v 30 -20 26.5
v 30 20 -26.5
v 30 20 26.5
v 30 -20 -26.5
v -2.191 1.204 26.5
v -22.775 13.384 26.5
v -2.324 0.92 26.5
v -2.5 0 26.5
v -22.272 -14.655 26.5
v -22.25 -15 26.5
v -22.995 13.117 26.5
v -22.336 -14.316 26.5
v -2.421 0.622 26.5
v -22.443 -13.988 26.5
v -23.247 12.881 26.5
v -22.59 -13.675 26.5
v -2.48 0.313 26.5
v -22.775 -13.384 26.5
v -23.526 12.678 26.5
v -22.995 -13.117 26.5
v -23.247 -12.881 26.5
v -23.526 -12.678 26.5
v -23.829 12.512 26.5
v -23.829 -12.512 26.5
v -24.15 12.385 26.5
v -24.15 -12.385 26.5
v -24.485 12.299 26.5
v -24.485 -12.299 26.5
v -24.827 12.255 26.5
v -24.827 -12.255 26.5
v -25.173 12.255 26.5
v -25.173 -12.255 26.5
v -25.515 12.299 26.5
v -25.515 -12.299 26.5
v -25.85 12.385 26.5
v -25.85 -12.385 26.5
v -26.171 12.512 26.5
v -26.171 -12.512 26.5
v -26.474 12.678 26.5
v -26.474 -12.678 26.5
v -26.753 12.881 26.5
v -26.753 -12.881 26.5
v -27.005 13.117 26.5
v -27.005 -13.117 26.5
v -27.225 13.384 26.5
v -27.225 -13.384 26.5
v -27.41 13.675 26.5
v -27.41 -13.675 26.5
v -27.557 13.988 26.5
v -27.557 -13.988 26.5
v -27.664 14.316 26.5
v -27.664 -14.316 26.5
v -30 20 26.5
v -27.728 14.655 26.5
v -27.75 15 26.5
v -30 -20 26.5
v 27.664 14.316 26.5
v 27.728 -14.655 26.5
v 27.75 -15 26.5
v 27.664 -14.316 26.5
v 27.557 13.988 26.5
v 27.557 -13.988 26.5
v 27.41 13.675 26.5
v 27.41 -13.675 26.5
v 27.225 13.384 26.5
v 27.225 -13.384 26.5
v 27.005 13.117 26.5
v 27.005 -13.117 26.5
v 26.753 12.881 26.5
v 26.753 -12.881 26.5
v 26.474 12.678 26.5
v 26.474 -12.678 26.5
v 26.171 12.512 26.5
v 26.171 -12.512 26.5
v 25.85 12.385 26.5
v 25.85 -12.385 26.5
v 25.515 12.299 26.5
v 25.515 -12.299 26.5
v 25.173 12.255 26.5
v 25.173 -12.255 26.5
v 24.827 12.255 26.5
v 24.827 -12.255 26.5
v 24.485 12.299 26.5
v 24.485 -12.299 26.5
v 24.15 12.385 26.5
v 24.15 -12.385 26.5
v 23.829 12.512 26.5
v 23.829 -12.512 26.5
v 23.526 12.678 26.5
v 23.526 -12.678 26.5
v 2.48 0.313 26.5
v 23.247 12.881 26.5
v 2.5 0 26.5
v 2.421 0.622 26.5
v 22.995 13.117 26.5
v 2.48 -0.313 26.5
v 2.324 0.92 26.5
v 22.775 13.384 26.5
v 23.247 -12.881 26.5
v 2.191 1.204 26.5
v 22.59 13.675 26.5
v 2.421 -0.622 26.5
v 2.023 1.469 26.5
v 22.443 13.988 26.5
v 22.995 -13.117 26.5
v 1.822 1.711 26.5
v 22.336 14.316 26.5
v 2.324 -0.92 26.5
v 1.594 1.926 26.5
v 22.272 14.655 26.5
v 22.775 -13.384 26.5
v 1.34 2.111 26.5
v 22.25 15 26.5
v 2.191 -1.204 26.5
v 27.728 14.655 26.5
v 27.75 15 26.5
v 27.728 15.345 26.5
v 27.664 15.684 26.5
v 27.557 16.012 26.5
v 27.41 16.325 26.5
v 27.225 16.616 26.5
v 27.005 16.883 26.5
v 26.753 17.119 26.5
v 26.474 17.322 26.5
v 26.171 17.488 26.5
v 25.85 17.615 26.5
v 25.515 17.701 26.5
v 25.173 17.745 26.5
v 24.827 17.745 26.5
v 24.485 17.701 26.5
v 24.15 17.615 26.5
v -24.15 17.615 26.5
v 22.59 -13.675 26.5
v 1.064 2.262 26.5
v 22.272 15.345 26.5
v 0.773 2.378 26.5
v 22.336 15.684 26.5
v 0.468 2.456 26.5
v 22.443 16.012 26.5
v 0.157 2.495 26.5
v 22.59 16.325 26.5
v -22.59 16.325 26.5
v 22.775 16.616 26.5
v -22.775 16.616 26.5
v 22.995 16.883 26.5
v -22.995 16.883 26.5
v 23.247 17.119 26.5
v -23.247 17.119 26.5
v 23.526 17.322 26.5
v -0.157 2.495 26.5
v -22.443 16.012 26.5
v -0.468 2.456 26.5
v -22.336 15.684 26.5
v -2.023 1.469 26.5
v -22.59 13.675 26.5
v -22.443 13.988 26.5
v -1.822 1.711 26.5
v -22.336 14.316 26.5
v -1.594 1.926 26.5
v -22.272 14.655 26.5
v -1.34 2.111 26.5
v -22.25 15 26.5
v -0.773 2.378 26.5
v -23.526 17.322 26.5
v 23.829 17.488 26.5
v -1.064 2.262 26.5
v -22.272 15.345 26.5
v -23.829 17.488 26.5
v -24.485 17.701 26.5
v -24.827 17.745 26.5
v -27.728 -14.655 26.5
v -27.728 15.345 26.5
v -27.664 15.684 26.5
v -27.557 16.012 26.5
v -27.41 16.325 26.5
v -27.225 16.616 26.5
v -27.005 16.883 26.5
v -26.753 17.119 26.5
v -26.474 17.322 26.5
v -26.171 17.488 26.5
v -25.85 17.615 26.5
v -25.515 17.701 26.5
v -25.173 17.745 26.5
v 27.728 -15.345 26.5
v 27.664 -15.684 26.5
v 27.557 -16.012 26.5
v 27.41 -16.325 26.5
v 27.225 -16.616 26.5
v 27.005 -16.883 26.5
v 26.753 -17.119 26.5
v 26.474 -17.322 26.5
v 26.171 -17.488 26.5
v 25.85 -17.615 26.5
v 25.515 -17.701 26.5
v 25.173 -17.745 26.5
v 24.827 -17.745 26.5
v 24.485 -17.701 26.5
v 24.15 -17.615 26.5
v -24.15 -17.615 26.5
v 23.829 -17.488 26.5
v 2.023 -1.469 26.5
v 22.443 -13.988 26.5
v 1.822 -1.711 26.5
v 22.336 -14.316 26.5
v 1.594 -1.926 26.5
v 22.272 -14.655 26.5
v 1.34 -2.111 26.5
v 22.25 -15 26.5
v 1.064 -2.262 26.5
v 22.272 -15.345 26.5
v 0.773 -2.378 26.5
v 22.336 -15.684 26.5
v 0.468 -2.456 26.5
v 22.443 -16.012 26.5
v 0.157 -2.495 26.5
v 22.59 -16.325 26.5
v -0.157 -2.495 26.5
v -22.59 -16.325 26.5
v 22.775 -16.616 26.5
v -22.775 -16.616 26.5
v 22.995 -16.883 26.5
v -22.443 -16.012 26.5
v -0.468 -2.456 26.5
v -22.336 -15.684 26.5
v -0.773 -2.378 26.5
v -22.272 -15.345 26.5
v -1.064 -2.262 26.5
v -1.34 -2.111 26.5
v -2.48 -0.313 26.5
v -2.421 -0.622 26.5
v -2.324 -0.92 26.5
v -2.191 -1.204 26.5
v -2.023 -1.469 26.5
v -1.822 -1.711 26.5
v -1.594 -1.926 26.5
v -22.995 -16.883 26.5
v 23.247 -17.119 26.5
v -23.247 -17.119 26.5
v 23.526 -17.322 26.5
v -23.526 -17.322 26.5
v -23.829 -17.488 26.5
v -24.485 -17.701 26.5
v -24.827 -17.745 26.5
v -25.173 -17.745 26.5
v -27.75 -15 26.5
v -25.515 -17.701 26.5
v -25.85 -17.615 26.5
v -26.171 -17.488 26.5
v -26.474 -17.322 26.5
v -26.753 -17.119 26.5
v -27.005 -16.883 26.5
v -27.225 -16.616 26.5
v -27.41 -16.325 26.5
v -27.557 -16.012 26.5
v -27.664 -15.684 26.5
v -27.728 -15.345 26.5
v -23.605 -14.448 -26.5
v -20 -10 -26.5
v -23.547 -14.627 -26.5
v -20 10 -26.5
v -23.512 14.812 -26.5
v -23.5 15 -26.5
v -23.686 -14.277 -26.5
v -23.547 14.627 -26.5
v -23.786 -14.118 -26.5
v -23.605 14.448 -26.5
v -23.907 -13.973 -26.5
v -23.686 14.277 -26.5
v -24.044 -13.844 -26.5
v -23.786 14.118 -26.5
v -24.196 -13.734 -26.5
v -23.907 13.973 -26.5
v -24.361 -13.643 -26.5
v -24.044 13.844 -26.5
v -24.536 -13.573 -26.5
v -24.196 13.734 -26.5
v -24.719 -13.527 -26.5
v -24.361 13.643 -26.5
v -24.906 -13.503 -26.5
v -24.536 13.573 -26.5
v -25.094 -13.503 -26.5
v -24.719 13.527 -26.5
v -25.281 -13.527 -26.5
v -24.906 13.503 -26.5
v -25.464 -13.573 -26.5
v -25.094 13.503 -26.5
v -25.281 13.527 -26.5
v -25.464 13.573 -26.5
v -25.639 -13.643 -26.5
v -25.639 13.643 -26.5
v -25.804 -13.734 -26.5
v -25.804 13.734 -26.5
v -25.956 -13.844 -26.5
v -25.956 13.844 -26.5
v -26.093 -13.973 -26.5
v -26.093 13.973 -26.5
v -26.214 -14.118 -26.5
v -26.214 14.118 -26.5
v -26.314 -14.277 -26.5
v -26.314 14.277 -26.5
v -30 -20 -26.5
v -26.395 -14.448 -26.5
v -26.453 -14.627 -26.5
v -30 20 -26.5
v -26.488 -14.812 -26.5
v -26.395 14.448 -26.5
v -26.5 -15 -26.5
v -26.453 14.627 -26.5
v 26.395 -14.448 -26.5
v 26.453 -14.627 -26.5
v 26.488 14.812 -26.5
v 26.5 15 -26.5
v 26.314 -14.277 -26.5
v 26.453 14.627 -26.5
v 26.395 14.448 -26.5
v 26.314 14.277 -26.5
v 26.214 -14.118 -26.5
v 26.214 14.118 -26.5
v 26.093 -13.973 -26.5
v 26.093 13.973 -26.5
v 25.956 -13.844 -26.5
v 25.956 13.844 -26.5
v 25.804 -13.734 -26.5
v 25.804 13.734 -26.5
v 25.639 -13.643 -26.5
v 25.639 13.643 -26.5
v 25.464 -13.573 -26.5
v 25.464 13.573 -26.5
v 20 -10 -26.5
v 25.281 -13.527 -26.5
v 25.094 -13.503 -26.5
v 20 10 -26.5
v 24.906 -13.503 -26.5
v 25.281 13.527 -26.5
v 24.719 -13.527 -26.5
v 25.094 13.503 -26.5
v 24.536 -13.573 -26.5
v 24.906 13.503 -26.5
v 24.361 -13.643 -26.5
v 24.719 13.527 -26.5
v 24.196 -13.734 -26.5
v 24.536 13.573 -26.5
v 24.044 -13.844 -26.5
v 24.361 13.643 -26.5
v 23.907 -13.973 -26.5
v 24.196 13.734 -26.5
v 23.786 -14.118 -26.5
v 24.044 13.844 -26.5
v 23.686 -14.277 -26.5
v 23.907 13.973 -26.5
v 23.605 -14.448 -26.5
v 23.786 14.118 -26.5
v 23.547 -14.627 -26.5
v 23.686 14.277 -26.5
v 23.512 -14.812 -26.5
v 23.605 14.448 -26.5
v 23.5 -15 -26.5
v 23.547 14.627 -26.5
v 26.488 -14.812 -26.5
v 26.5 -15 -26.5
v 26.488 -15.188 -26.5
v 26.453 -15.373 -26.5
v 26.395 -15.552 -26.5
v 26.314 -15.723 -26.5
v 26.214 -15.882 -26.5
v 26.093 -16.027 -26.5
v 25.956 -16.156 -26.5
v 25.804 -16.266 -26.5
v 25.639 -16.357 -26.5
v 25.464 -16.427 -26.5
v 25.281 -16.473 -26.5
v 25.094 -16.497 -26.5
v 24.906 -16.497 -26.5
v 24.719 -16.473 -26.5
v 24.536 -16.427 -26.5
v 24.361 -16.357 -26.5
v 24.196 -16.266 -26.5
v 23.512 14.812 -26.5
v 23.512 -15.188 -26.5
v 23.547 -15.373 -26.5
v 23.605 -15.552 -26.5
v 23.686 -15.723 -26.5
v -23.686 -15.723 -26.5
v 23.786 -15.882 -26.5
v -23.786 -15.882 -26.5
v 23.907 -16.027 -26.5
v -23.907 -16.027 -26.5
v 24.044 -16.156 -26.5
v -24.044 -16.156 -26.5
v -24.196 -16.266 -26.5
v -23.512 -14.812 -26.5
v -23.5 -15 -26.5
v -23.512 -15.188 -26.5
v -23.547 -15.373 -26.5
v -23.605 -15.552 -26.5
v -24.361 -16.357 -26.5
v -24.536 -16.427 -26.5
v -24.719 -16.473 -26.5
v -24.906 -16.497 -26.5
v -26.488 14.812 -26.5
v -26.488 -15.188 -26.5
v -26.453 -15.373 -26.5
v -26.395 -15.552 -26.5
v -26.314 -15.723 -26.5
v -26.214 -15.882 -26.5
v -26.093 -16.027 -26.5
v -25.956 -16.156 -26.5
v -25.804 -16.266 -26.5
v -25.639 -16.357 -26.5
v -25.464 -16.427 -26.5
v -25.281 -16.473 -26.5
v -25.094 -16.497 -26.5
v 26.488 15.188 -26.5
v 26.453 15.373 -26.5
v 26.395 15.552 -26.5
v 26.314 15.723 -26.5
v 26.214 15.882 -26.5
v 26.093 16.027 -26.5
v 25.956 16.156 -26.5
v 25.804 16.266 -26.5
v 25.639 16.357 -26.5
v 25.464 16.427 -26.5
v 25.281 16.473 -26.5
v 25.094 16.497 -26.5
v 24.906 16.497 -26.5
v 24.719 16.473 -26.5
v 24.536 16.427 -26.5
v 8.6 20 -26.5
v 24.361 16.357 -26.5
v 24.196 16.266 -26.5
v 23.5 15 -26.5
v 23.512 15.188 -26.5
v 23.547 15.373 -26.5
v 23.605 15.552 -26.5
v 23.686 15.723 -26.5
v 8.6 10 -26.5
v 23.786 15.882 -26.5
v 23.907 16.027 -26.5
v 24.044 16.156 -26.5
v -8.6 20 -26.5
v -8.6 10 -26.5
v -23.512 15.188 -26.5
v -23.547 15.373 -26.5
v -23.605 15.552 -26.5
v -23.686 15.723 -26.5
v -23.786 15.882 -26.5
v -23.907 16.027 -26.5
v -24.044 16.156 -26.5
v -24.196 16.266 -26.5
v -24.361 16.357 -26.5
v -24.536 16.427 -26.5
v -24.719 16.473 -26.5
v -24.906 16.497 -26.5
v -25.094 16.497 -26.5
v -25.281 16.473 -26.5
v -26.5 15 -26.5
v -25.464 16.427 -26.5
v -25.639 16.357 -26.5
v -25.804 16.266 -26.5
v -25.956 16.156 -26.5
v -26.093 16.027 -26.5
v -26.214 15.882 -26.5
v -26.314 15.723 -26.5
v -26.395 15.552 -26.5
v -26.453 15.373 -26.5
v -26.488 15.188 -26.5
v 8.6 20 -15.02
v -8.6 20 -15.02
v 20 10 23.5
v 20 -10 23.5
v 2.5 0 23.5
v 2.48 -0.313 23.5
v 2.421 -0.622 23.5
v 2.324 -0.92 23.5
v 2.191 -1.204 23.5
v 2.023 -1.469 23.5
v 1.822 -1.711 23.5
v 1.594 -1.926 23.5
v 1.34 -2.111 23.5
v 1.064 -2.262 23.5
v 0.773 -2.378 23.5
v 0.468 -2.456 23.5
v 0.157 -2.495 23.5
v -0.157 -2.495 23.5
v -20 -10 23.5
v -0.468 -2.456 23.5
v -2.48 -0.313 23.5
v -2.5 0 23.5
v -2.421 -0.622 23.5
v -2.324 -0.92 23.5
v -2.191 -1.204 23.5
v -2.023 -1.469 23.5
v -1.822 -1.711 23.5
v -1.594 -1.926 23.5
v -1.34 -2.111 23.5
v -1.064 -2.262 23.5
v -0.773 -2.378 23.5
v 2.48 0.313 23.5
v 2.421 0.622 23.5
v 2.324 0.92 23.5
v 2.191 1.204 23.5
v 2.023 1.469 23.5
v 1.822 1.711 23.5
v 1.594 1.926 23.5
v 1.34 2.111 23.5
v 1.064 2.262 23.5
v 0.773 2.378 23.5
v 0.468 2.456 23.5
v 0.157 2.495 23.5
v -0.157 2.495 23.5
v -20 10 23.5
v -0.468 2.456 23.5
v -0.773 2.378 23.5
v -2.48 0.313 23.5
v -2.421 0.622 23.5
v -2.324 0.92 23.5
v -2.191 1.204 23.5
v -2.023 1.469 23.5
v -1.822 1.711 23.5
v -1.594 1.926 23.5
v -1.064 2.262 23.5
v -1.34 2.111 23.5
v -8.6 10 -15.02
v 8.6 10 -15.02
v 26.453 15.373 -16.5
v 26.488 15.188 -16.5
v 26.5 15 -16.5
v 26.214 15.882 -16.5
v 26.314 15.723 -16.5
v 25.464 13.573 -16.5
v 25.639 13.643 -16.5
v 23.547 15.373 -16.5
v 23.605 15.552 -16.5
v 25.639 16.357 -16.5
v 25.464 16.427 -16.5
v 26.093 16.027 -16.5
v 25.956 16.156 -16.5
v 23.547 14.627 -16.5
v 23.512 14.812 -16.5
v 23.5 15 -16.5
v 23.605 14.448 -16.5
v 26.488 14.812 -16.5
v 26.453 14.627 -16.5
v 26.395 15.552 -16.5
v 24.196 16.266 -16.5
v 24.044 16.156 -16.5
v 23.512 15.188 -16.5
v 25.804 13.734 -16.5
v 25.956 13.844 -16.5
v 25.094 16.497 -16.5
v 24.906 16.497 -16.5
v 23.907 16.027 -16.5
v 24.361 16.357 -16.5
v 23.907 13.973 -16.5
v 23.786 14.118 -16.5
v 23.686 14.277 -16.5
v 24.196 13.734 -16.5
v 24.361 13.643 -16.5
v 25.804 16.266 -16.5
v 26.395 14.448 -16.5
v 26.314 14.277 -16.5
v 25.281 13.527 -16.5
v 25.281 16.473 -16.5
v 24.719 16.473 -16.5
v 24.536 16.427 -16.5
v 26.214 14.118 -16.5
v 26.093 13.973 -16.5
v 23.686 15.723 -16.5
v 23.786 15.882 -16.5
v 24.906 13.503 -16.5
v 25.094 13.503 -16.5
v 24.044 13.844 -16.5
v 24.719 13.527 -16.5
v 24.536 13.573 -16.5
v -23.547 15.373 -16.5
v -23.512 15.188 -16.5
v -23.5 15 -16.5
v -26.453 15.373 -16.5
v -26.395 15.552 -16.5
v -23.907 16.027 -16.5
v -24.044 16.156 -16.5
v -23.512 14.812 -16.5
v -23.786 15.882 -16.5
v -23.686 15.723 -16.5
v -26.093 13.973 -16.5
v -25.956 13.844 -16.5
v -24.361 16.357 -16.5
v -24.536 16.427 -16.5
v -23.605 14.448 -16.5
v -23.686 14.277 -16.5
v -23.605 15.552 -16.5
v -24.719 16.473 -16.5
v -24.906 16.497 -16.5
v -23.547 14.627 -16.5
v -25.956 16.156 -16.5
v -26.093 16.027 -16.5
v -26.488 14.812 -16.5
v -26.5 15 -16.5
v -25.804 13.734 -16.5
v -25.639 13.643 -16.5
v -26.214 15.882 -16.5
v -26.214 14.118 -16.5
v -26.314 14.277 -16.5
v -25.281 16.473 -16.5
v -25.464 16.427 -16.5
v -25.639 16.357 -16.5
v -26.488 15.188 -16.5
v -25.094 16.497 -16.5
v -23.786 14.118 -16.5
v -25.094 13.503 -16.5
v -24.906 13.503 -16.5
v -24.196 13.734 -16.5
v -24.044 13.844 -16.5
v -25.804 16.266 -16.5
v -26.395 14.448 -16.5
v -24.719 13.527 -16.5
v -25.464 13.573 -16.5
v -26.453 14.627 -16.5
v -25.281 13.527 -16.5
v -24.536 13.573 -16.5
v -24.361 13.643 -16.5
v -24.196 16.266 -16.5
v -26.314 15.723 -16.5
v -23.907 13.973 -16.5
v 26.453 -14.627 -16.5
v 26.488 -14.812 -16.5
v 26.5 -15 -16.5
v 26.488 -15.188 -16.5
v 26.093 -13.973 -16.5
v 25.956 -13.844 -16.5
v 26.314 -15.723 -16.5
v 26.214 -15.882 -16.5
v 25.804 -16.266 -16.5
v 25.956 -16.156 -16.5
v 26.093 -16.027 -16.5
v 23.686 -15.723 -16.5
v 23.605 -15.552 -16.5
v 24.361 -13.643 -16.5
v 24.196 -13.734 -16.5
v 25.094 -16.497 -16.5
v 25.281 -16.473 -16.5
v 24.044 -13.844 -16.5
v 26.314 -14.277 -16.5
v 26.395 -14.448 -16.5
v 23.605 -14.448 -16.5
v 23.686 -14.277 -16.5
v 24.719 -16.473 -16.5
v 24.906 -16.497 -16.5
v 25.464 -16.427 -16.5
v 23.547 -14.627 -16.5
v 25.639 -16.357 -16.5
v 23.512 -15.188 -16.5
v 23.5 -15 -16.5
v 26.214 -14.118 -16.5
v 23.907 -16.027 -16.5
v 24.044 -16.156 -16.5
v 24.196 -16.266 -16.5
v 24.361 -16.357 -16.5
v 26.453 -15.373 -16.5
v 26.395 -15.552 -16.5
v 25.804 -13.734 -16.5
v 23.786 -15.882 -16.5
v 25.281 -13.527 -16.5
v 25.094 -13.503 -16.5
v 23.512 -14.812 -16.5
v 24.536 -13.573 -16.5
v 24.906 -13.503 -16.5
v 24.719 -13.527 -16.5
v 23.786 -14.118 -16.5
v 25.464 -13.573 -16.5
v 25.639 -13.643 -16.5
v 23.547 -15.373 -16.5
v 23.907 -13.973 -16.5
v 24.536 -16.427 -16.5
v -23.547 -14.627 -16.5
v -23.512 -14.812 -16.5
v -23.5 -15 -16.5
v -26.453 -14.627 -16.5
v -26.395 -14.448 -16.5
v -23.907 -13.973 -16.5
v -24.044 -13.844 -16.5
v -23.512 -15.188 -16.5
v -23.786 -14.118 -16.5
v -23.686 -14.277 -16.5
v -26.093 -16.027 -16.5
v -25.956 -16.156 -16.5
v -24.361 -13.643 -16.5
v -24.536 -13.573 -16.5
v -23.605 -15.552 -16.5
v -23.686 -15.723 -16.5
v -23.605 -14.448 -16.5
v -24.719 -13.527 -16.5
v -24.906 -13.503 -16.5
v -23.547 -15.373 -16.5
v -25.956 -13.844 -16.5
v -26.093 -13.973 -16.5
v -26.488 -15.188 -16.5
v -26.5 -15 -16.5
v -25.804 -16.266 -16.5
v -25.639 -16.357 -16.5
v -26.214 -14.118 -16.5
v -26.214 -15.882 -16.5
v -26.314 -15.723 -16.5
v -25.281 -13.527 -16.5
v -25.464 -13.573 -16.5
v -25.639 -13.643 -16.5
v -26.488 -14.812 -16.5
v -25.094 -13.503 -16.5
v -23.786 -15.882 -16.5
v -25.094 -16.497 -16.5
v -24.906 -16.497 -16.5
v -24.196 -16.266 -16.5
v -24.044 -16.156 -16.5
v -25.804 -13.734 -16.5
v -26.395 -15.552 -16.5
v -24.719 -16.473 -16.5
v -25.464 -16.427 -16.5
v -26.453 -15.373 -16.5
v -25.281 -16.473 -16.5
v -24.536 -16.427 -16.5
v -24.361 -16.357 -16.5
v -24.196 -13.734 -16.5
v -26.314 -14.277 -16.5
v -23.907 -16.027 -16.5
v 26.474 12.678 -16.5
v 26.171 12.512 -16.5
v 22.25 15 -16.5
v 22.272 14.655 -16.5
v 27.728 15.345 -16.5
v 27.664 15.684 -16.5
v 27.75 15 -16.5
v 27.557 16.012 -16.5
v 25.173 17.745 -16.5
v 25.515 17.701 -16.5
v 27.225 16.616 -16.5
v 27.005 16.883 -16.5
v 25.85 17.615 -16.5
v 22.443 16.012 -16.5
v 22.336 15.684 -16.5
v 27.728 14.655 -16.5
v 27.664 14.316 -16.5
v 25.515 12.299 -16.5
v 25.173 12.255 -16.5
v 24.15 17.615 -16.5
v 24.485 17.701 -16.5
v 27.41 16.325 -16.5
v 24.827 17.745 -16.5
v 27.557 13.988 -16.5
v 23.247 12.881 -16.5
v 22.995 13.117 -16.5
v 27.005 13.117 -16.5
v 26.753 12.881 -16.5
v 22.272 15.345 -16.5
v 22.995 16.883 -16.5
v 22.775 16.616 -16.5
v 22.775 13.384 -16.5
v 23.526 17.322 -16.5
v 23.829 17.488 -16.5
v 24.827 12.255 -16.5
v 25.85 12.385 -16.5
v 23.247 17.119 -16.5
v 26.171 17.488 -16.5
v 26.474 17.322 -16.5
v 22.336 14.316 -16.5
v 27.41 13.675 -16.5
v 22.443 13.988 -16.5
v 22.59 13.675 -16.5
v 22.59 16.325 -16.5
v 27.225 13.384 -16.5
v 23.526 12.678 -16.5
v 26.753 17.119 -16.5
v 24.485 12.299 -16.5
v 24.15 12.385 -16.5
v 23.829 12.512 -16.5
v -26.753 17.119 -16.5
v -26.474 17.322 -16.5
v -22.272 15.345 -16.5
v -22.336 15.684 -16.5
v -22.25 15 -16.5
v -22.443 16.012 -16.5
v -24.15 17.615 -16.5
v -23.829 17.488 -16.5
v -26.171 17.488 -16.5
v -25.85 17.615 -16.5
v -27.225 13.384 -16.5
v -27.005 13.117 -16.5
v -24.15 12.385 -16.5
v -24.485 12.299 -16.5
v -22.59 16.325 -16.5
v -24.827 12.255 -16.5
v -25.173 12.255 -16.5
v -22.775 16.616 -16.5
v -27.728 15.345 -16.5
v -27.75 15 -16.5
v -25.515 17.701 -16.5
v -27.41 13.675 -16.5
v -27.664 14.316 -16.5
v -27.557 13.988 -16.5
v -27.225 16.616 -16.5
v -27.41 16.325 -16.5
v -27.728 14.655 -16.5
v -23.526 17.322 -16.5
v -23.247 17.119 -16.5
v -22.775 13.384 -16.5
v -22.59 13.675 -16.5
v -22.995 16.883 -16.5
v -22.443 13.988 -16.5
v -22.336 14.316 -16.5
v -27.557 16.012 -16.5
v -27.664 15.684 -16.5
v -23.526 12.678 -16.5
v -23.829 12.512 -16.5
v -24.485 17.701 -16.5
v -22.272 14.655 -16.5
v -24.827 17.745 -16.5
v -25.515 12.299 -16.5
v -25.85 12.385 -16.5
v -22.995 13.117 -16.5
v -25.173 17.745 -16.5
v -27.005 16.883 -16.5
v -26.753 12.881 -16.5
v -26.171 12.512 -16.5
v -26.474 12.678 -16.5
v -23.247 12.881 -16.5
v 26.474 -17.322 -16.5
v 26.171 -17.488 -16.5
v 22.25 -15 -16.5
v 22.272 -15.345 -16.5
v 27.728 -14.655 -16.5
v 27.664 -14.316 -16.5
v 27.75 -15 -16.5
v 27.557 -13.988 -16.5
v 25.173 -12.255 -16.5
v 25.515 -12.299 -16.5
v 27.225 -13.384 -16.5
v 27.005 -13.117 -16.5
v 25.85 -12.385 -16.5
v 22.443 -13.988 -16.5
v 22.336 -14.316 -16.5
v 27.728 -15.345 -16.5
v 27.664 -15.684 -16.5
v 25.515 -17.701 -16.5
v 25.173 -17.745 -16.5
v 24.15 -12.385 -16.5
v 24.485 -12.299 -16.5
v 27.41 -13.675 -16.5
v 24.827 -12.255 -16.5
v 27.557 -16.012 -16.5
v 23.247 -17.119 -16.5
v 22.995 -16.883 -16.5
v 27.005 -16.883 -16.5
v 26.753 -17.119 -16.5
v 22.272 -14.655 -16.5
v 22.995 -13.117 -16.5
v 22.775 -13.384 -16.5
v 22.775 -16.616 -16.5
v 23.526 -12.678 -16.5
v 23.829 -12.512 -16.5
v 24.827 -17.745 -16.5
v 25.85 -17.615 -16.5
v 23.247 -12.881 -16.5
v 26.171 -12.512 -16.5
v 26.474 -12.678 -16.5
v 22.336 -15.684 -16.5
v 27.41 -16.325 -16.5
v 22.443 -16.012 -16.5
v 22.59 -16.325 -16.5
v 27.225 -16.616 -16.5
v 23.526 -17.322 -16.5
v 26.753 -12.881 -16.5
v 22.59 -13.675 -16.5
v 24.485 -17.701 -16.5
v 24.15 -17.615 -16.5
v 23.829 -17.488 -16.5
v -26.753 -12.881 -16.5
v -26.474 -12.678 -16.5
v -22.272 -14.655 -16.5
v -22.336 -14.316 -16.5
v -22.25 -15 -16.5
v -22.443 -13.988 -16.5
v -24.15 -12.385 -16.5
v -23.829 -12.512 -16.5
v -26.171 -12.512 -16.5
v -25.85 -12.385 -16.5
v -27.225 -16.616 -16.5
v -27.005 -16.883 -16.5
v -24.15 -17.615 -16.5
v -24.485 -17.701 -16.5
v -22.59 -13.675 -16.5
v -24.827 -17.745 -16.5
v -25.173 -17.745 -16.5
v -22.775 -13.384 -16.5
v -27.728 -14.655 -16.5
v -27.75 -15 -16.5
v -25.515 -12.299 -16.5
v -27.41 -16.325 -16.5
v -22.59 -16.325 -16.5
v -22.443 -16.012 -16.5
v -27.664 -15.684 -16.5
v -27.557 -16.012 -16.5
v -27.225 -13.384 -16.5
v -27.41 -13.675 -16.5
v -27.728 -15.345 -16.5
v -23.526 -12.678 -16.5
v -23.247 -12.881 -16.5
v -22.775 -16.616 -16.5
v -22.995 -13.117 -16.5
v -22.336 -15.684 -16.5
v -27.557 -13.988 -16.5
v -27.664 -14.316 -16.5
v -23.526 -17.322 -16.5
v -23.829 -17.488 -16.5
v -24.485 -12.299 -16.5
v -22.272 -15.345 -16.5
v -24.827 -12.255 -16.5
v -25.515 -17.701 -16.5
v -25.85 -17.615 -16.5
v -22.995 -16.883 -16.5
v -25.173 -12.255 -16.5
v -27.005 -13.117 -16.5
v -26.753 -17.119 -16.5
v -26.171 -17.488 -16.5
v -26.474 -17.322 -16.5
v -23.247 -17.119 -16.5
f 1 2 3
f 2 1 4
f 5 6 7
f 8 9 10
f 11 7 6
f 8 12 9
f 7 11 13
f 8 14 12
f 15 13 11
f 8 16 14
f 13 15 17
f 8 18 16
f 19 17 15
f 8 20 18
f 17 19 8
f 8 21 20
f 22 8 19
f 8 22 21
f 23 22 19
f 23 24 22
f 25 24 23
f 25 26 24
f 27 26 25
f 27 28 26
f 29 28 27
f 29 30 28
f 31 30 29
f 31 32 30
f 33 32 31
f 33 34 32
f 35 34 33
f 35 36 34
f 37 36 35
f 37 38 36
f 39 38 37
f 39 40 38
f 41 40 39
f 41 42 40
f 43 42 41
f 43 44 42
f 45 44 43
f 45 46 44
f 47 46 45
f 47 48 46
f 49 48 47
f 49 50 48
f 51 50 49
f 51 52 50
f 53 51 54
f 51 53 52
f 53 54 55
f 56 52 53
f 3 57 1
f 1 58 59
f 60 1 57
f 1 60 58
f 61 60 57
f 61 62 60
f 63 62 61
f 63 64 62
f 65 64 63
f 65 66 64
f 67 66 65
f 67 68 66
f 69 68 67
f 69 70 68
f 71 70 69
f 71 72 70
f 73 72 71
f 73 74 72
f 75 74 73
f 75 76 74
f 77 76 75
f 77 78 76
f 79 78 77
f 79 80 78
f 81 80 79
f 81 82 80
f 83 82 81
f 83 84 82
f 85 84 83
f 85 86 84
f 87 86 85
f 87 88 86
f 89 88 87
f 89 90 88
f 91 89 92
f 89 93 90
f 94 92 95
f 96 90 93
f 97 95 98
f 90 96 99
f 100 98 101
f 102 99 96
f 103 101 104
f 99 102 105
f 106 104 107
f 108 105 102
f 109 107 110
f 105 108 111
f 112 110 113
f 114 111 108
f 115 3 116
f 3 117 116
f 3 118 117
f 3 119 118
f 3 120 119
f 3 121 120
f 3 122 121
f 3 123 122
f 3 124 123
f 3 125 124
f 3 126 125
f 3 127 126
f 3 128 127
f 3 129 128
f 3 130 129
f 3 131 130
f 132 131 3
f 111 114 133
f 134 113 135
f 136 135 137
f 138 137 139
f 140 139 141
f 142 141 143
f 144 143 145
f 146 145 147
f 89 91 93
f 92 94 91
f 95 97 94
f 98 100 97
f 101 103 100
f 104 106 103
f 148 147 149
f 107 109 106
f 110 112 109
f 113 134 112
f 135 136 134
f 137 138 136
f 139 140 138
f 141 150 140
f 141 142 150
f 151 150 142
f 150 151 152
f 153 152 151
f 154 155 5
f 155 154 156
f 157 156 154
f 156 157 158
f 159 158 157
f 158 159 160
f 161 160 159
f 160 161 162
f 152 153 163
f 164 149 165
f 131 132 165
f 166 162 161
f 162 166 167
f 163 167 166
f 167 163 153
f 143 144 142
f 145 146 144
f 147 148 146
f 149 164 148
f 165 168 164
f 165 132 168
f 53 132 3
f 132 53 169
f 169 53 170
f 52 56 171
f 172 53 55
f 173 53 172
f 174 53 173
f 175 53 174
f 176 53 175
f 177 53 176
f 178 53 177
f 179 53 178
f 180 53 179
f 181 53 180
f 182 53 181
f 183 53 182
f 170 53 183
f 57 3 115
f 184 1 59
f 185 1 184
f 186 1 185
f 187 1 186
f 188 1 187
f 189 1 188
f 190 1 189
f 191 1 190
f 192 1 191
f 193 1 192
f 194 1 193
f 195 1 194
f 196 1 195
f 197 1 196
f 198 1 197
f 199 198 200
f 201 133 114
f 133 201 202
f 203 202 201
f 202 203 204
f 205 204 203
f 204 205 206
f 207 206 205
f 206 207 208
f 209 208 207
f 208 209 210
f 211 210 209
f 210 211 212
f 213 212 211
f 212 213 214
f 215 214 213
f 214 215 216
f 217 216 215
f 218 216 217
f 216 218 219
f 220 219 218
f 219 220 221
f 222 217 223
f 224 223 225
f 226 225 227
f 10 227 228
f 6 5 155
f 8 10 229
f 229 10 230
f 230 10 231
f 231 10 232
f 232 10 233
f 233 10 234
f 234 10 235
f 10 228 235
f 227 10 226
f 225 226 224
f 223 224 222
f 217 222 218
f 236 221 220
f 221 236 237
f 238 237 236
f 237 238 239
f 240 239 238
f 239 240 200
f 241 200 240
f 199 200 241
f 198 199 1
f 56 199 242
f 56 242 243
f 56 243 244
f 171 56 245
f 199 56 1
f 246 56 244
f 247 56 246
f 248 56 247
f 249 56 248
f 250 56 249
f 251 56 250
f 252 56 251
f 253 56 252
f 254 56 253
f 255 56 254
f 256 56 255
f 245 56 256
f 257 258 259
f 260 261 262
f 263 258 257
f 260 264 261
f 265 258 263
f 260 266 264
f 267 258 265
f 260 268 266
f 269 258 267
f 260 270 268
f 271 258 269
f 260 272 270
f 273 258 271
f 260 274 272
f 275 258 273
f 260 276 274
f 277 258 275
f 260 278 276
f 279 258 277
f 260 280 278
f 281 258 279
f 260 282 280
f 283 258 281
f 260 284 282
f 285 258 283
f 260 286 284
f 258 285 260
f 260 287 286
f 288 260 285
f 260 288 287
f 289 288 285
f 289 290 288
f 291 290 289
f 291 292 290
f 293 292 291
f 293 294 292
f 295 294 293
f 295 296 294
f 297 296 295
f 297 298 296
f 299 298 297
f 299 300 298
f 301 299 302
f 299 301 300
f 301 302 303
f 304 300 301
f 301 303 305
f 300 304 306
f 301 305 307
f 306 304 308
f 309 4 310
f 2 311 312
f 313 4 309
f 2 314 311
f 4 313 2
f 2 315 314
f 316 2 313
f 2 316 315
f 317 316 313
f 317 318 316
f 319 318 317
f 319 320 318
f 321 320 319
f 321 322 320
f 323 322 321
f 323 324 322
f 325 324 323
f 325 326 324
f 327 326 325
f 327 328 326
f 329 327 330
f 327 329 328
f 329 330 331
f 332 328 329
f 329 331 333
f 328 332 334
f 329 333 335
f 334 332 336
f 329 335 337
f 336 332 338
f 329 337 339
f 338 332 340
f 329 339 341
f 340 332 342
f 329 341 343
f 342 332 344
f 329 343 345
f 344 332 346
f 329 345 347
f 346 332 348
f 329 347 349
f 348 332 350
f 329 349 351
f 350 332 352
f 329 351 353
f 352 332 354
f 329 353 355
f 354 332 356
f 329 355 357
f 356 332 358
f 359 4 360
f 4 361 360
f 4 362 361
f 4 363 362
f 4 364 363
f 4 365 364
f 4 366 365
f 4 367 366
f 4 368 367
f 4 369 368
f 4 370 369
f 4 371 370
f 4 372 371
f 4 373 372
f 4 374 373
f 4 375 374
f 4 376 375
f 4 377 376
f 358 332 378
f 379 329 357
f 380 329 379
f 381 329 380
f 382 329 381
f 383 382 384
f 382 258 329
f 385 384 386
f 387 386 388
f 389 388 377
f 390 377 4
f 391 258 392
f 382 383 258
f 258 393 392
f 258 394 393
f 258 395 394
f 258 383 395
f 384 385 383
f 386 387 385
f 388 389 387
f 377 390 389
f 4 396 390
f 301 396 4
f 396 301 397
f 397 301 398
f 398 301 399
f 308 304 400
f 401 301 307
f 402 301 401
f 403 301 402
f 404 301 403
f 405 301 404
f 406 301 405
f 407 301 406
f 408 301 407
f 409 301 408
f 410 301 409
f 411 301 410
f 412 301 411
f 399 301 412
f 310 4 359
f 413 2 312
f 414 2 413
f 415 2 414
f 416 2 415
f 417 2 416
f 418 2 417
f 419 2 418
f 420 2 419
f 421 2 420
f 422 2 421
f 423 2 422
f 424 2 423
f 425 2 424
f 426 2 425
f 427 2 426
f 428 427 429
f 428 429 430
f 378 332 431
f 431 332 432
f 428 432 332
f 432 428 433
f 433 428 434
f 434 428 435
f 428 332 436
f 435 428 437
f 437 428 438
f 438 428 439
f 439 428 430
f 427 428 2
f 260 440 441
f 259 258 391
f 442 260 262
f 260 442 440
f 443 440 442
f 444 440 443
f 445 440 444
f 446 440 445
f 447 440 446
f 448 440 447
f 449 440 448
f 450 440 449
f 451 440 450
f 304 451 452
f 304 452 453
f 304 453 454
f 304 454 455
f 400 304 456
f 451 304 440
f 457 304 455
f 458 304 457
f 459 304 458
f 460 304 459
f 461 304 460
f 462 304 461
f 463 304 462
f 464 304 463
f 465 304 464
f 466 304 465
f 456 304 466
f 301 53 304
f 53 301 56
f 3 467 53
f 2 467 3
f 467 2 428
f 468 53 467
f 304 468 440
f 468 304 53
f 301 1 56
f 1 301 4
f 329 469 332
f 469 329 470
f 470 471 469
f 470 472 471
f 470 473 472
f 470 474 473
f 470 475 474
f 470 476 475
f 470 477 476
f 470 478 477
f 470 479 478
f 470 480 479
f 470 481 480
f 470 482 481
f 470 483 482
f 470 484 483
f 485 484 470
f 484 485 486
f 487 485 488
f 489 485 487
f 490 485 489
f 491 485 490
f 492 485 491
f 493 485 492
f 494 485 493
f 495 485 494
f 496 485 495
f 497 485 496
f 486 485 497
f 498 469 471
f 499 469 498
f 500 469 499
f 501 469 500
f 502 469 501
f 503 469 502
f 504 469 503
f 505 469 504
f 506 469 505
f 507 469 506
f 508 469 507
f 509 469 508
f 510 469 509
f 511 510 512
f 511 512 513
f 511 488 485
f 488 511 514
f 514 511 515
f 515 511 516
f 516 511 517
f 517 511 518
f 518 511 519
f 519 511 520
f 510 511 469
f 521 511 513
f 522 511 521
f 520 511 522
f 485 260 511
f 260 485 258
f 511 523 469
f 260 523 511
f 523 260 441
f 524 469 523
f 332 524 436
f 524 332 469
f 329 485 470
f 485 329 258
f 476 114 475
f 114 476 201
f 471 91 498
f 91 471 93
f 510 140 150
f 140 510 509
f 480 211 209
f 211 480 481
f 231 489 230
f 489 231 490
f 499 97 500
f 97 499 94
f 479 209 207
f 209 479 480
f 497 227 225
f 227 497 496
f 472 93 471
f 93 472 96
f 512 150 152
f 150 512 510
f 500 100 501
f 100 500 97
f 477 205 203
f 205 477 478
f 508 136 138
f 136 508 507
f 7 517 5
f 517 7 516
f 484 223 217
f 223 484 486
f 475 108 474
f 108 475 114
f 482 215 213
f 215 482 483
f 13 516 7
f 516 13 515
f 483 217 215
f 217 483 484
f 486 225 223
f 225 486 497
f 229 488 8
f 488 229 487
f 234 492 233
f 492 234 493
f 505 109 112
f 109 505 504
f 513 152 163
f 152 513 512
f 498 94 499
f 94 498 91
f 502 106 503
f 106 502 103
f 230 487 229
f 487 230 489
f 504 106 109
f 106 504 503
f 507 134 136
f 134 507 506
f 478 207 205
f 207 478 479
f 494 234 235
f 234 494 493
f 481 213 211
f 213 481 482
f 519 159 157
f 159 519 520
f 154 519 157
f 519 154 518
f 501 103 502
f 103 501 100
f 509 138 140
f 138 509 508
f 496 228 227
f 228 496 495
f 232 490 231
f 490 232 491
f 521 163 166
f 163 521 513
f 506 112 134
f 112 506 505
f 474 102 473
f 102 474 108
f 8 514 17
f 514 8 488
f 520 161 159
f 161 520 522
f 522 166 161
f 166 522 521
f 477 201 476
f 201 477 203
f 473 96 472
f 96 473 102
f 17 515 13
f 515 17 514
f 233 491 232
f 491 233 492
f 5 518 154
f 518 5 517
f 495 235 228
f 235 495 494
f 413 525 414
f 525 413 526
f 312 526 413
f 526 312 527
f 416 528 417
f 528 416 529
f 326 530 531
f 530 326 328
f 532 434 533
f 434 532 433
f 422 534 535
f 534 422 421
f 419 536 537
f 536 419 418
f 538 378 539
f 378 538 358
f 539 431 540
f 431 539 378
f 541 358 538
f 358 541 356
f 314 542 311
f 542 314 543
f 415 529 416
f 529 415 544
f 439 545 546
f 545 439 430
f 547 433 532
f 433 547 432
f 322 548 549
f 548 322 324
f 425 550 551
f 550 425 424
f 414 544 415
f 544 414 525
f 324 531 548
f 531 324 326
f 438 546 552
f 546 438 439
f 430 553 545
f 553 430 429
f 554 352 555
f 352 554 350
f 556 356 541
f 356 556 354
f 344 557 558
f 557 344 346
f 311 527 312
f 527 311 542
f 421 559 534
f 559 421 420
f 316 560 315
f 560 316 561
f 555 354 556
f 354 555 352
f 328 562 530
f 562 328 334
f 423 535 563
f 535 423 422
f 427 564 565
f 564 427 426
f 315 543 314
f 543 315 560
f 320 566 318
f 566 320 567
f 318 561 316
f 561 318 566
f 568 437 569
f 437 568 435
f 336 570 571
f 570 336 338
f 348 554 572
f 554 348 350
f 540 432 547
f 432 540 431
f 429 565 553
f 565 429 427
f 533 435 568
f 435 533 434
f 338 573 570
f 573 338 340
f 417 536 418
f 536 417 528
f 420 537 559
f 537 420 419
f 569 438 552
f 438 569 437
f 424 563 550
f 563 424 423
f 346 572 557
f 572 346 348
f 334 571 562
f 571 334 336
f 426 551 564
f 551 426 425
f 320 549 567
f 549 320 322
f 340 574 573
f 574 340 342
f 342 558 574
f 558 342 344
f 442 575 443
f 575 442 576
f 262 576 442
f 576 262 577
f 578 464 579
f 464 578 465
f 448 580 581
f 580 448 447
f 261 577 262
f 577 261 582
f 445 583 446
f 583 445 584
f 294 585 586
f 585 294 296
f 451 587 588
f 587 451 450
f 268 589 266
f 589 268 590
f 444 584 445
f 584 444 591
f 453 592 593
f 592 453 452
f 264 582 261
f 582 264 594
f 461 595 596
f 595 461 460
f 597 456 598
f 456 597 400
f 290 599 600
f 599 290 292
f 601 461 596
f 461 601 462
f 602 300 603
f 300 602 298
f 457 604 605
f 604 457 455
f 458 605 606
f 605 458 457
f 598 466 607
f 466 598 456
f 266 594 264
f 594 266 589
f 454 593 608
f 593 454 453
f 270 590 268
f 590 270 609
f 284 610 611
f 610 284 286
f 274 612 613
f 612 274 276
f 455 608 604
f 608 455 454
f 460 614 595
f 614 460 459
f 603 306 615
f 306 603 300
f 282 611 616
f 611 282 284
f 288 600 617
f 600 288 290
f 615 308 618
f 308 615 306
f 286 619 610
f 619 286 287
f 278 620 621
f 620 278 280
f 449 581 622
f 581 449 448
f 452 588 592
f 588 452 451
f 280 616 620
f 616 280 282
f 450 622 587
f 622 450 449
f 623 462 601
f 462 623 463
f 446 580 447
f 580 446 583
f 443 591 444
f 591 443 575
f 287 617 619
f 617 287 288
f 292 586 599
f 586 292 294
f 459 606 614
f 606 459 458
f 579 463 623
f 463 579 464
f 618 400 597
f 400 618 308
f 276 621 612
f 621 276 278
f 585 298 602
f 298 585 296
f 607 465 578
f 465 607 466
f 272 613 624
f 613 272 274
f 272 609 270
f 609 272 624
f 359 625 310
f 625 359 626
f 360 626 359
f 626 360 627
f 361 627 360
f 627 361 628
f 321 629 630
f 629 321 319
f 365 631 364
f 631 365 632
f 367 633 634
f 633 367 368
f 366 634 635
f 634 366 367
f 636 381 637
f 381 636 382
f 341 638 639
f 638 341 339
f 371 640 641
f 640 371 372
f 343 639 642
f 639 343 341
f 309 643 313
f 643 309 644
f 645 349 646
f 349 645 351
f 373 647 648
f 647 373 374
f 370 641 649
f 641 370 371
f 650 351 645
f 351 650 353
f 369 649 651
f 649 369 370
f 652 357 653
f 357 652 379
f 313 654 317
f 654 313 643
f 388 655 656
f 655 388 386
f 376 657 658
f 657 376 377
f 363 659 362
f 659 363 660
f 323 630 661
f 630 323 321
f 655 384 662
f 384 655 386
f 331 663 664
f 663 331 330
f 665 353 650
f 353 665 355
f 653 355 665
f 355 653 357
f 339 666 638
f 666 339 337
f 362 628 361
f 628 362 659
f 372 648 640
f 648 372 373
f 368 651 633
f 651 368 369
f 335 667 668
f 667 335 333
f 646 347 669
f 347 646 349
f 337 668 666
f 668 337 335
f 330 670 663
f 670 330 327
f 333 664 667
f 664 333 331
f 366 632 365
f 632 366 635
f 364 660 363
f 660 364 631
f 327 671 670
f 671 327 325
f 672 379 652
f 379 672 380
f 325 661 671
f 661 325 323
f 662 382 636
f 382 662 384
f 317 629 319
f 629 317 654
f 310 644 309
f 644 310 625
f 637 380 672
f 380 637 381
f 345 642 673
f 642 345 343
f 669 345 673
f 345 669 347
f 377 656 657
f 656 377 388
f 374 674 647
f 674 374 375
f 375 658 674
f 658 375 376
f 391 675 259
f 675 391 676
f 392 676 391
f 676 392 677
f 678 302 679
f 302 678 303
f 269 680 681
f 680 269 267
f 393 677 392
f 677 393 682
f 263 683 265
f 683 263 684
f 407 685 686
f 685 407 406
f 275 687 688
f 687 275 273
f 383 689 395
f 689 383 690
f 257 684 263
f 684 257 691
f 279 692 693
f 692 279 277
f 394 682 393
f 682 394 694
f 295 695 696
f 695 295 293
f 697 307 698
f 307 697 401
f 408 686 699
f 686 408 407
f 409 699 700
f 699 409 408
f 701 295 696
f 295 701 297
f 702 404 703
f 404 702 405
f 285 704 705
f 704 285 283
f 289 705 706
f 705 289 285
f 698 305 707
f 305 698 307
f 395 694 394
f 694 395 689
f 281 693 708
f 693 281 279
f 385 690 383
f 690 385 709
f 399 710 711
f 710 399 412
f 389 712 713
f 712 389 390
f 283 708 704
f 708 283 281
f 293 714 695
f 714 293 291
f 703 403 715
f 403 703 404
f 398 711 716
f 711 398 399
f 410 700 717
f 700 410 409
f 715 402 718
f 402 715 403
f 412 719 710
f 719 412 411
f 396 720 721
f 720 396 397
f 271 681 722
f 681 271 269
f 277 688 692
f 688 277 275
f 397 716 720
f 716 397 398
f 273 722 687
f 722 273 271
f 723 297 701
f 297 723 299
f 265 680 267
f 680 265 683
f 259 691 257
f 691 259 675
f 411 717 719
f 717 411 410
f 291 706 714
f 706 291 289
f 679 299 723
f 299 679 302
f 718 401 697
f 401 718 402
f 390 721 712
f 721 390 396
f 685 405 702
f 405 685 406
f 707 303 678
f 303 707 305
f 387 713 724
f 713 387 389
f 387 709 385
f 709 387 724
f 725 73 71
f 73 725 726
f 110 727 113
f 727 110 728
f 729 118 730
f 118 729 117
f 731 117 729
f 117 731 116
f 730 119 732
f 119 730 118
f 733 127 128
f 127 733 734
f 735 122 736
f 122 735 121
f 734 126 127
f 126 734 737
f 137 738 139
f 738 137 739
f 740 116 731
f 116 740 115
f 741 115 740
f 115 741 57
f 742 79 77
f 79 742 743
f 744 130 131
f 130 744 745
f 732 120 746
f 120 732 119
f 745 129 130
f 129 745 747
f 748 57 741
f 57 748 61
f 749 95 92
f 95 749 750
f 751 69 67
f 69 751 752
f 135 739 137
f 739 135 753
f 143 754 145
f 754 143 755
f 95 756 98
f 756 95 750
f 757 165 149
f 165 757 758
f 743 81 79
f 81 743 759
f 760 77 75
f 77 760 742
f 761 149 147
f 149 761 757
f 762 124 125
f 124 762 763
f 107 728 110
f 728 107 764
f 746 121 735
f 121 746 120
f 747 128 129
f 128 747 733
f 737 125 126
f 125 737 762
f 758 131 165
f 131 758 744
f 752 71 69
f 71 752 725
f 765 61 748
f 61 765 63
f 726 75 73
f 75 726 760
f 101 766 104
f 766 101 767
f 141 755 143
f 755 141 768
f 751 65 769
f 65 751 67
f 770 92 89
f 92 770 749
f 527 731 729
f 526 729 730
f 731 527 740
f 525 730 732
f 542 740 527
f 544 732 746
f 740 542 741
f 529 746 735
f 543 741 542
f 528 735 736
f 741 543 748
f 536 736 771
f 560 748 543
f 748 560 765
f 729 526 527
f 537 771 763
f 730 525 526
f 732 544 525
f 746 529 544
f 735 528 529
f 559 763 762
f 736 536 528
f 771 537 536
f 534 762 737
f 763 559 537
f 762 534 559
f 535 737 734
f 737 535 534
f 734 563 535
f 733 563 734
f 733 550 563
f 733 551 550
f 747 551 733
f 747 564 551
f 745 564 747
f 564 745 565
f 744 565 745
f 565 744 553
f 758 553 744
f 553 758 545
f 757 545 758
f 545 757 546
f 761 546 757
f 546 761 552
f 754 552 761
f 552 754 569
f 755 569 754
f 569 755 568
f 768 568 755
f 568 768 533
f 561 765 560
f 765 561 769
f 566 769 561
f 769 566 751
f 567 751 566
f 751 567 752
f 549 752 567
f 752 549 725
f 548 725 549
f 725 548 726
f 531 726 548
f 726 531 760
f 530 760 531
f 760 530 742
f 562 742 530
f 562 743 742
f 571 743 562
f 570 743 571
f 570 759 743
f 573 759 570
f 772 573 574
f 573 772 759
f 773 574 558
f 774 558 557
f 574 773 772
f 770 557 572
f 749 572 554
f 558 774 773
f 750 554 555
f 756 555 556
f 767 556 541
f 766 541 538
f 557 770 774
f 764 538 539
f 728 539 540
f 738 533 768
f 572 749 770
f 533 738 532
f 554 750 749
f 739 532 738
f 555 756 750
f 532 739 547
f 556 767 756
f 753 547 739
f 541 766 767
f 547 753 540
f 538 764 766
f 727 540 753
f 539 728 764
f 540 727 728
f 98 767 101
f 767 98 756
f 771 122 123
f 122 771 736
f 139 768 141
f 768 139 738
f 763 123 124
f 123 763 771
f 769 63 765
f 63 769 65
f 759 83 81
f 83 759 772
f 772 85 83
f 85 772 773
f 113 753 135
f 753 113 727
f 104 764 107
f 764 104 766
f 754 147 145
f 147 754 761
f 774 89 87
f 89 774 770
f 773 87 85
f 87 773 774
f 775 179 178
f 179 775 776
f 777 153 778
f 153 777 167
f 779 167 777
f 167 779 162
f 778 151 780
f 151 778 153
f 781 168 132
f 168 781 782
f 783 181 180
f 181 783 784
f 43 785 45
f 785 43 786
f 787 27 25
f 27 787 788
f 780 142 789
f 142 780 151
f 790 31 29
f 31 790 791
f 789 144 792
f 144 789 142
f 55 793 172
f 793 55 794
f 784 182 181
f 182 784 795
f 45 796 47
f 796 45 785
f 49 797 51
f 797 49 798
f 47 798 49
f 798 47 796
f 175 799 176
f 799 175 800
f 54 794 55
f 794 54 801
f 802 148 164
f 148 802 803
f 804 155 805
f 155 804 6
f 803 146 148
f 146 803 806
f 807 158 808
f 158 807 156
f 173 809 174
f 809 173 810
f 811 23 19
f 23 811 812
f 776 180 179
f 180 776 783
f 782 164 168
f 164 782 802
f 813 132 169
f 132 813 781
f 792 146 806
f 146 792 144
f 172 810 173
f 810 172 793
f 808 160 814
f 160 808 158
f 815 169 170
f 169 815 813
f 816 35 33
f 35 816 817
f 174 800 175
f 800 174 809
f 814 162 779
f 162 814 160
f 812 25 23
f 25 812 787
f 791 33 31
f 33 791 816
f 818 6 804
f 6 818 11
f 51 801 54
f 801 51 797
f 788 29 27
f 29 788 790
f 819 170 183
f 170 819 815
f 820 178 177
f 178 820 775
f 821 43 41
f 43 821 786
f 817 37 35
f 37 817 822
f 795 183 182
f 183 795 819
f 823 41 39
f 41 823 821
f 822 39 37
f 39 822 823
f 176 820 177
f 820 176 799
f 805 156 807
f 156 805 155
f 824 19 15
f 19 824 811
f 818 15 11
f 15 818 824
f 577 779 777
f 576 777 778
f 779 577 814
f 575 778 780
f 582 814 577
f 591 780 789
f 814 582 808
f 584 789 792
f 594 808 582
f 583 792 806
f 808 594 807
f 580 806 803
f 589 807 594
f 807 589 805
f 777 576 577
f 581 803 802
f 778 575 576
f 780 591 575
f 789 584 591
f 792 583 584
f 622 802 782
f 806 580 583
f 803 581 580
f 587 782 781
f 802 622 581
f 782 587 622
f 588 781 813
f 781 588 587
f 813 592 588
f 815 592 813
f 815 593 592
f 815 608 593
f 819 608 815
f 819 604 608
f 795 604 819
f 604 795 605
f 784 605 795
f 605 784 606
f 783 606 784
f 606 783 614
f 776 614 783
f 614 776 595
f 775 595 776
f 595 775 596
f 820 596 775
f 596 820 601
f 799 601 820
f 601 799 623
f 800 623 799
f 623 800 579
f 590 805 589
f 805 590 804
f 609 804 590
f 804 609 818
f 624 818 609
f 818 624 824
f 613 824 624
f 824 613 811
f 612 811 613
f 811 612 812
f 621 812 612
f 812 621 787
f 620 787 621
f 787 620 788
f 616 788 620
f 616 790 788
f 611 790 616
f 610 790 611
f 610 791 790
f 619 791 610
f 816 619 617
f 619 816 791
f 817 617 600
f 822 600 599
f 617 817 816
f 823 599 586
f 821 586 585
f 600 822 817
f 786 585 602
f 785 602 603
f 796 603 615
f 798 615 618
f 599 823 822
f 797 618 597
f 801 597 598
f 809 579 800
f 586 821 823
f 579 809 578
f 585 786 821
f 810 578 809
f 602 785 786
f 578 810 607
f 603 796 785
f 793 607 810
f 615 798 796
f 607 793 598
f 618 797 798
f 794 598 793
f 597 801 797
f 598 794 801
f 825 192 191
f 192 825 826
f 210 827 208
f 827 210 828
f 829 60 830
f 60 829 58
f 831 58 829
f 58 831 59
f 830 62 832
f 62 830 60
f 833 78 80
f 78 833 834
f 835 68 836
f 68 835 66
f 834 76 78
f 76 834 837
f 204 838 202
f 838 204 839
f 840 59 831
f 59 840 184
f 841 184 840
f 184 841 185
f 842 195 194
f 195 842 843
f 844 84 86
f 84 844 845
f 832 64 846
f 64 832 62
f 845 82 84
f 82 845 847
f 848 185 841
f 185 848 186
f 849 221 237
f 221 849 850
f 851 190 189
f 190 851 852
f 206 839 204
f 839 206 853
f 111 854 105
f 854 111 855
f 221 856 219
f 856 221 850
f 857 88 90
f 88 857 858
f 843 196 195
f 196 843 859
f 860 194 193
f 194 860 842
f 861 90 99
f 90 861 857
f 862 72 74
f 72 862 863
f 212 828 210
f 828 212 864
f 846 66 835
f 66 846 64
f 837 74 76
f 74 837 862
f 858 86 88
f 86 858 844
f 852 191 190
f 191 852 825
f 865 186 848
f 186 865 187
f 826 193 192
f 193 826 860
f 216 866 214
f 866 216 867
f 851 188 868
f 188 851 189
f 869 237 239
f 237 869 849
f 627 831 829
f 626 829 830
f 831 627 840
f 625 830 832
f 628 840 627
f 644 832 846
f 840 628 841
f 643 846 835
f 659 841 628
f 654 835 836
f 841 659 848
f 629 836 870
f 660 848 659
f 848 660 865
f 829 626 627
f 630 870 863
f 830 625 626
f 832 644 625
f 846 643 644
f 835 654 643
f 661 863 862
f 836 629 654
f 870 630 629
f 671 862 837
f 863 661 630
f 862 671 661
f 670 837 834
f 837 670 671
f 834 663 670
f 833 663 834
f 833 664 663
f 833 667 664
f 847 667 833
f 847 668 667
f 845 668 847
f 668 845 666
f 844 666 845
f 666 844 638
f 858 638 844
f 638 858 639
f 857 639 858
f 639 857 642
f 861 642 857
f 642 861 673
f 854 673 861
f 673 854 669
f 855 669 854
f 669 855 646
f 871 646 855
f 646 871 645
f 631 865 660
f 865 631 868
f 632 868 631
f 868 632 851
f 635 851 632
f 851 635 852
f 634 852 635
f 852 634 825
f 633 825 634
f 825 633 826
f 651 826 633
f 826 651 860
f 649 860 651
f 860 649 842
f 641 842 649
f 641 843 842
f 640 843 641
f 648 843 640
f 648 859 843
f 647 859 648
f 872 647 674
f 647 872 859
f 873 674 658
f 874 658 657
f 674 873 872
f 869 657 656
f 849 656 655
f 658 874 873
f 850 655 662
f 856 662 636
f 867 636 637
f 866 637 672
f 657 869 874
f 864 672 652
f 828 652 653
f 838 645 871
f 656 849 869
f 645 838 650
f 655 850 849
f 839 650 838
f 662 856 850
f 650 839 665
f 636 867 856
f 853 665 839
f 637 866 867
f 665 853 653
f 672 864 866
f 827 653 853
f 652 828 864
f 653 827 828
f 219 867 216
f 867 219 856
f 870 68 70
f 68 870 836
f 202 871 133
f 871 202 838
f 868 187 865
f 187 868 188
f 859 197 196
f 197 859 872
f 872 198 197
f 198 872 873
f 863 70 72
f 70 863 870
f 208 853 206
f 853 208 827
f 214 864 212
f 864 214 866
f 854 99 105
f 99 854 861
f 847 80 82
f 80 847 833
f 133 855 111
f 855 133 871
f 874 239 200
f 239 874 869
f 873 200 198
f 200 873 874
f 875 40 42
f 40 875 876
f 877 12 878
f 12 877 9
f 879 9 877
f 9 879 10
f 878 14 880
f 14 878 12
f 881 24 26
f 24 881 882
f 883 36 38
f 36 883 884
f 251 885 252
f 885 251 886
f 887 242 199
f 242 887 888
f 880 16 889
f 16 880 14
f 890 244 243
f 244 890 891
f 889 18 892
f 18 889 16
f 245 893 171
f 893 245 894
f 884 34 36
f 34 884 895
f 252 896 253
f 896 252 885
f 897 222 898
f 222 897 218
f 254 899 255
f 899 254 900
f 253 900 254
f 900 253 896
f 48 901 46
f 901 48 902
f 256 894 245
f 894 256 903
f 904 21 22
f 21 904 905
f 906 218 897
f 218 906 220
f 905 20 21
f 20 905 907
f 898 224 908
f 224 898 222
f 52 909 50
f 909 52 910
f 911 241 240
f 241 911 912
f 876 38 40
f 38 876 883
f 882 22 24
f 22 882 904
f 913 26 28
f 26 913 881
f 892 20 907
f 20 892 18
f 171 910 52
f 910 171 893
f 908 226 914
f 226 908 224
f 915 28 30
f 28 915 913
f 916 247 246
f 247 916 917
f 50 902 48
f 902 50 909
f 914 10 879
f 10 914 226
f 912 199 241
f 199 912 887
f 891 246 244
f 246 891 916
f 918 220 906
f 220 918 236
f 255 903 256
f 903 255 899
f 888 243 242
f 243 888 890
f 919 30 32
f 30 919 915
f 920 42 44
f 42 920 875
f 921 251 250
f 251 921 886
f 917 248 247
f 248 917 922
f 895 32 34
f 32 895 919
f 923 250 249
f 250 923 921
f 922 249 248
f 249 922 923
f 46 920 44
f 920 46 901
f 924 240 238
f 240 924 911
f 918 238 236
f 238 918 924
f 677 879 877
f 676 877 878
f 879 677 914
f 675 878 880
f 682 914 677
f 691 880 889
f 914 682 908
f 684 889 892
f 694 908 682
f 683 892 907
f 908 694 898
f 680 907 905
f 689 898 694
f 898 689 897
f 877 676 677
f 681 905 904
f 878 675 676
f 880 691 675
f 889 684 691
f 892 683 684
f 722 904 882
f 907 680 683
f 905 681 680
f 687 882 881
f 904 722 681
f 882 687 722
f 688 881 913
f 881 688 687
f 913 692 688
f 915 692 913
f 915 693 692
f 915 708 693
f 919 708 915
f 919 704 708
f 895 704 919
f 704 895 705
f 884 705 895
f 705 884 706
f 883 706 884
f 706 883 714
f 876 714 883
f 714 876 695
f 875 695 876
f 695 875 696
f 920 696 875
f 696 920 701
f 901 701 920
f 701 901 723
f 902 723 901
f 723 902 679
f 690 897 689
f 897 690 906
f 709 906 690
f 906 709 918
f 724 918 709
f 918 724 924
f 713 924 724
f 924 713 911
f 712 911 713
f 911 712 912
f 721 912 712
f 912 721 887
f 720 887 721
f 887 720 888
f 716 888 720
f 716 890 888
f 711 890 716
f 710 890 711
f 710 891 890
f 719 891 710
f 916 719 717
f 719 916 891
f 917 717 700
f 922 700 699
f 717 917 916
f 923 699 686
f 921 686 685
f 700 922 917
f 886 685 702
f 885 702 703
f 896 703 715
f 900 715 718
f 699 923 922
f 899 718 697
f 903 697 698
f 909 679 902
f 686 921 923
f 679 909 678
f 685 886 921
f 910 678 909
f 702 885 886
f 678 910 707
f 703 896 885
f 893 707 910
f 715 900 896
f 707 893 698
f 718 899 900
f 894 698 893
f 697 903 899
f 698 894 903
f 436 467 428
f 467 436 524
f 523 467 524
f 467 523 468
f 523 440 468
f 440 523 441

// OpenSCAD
Height=50; //
X=40; //
Y=20; //
A=17.2;

C=11.48;

Borediameter=5;
Nutdiameter=3;
Nutscrewdiameter=5.5;
difference() {
        
    cube([(X+20),(Y+20),Height+3],center=true);
    translate([0,0,-3])
    cube([X,Y,Height+3],center=true);
    translate([0,0,0])
    cylinder(h=(Height+3)/2,r1=Borediameter/2,r2=Borediameter/2,$fn=50);
    translate([((((X+20)-X)/4)+(X/2)),((((Y+20)-Y)/4)+(Y/2)),-((Height+3)/2)])
    cylinder(h=Height+3,r1=Nutdiameter/2,r2=Nutdiameter/2,$fn=50);
    translate([-((((X+20)-X)/4)+(X/2)),((((Y+20)-Y)/4)+(Y/2)),-((Height+3)/2)])
    cylinder(h=Height+3,r1=Nutdiameter/2,r2=Nutdiameter/2,$fn=50);
    translate([((((X+20)-X)/4)+(X/2)),-((((Y+20)-Y)/4)+(Y/2)),-((Height+3)/2)])
    cylinder(h=Height+3,r1=Nutdiameter/2,r2=Nutdiameter/2,$fn=50);
    translate([-((((X+20)-X)/4)+(X/2)),-((((Y+20)-Y)/4)+(Y/2)),-((Height+3)/2)])
    cylinder(h=Height+3,r1=Nutdiameter/2,r2=Nutdiameter/2,$fn=50);
    
    
    translate([((((X+20)-X)/4)+(X/2)),((((Y+20)-Y)/4)+(Y/2)),-((Height+3)/2)+10])
    cylinder(h=Height+3,r1=Nutscrewdiameter/2,r2=Nutscrewdiameter/2,$fn=50);
    translate([-((((X+20)-X)/4)+(X/2)),((((Y+20)-Y)/4)+(Y/2)),-((Height+3)/2)+10])
    cylinder(h=Height+3,r1=Nutscrewdiameter/2,r2=Nutscrewdiameter/2,$fn=50);
    translate([((((X+20)-X)/4)+(X/2)),-((((Y+20)-Y)/4)+(Y/2)),-((Height+3)/2)+10])
    cylinder(h=Height+3,r1=Nutscrewdiameter/2,r2=Nutscrewdiameter/2,$fn=50);
    translate([-((((X+20)-X)/4)+(X/2)),-((((Y+20)-Y)/4)+(Y/2)),-((Height+3)/2)+10])
    cylinder(h=Height+3,r1=Nutscrewdiameter/2,r2=Nutscrewdiameter/2,$fn=50);
    
    translate([-A/2,Y/2,-((Height+3)/2)])

    cube(size = [A,10000,C], center = false);
}
